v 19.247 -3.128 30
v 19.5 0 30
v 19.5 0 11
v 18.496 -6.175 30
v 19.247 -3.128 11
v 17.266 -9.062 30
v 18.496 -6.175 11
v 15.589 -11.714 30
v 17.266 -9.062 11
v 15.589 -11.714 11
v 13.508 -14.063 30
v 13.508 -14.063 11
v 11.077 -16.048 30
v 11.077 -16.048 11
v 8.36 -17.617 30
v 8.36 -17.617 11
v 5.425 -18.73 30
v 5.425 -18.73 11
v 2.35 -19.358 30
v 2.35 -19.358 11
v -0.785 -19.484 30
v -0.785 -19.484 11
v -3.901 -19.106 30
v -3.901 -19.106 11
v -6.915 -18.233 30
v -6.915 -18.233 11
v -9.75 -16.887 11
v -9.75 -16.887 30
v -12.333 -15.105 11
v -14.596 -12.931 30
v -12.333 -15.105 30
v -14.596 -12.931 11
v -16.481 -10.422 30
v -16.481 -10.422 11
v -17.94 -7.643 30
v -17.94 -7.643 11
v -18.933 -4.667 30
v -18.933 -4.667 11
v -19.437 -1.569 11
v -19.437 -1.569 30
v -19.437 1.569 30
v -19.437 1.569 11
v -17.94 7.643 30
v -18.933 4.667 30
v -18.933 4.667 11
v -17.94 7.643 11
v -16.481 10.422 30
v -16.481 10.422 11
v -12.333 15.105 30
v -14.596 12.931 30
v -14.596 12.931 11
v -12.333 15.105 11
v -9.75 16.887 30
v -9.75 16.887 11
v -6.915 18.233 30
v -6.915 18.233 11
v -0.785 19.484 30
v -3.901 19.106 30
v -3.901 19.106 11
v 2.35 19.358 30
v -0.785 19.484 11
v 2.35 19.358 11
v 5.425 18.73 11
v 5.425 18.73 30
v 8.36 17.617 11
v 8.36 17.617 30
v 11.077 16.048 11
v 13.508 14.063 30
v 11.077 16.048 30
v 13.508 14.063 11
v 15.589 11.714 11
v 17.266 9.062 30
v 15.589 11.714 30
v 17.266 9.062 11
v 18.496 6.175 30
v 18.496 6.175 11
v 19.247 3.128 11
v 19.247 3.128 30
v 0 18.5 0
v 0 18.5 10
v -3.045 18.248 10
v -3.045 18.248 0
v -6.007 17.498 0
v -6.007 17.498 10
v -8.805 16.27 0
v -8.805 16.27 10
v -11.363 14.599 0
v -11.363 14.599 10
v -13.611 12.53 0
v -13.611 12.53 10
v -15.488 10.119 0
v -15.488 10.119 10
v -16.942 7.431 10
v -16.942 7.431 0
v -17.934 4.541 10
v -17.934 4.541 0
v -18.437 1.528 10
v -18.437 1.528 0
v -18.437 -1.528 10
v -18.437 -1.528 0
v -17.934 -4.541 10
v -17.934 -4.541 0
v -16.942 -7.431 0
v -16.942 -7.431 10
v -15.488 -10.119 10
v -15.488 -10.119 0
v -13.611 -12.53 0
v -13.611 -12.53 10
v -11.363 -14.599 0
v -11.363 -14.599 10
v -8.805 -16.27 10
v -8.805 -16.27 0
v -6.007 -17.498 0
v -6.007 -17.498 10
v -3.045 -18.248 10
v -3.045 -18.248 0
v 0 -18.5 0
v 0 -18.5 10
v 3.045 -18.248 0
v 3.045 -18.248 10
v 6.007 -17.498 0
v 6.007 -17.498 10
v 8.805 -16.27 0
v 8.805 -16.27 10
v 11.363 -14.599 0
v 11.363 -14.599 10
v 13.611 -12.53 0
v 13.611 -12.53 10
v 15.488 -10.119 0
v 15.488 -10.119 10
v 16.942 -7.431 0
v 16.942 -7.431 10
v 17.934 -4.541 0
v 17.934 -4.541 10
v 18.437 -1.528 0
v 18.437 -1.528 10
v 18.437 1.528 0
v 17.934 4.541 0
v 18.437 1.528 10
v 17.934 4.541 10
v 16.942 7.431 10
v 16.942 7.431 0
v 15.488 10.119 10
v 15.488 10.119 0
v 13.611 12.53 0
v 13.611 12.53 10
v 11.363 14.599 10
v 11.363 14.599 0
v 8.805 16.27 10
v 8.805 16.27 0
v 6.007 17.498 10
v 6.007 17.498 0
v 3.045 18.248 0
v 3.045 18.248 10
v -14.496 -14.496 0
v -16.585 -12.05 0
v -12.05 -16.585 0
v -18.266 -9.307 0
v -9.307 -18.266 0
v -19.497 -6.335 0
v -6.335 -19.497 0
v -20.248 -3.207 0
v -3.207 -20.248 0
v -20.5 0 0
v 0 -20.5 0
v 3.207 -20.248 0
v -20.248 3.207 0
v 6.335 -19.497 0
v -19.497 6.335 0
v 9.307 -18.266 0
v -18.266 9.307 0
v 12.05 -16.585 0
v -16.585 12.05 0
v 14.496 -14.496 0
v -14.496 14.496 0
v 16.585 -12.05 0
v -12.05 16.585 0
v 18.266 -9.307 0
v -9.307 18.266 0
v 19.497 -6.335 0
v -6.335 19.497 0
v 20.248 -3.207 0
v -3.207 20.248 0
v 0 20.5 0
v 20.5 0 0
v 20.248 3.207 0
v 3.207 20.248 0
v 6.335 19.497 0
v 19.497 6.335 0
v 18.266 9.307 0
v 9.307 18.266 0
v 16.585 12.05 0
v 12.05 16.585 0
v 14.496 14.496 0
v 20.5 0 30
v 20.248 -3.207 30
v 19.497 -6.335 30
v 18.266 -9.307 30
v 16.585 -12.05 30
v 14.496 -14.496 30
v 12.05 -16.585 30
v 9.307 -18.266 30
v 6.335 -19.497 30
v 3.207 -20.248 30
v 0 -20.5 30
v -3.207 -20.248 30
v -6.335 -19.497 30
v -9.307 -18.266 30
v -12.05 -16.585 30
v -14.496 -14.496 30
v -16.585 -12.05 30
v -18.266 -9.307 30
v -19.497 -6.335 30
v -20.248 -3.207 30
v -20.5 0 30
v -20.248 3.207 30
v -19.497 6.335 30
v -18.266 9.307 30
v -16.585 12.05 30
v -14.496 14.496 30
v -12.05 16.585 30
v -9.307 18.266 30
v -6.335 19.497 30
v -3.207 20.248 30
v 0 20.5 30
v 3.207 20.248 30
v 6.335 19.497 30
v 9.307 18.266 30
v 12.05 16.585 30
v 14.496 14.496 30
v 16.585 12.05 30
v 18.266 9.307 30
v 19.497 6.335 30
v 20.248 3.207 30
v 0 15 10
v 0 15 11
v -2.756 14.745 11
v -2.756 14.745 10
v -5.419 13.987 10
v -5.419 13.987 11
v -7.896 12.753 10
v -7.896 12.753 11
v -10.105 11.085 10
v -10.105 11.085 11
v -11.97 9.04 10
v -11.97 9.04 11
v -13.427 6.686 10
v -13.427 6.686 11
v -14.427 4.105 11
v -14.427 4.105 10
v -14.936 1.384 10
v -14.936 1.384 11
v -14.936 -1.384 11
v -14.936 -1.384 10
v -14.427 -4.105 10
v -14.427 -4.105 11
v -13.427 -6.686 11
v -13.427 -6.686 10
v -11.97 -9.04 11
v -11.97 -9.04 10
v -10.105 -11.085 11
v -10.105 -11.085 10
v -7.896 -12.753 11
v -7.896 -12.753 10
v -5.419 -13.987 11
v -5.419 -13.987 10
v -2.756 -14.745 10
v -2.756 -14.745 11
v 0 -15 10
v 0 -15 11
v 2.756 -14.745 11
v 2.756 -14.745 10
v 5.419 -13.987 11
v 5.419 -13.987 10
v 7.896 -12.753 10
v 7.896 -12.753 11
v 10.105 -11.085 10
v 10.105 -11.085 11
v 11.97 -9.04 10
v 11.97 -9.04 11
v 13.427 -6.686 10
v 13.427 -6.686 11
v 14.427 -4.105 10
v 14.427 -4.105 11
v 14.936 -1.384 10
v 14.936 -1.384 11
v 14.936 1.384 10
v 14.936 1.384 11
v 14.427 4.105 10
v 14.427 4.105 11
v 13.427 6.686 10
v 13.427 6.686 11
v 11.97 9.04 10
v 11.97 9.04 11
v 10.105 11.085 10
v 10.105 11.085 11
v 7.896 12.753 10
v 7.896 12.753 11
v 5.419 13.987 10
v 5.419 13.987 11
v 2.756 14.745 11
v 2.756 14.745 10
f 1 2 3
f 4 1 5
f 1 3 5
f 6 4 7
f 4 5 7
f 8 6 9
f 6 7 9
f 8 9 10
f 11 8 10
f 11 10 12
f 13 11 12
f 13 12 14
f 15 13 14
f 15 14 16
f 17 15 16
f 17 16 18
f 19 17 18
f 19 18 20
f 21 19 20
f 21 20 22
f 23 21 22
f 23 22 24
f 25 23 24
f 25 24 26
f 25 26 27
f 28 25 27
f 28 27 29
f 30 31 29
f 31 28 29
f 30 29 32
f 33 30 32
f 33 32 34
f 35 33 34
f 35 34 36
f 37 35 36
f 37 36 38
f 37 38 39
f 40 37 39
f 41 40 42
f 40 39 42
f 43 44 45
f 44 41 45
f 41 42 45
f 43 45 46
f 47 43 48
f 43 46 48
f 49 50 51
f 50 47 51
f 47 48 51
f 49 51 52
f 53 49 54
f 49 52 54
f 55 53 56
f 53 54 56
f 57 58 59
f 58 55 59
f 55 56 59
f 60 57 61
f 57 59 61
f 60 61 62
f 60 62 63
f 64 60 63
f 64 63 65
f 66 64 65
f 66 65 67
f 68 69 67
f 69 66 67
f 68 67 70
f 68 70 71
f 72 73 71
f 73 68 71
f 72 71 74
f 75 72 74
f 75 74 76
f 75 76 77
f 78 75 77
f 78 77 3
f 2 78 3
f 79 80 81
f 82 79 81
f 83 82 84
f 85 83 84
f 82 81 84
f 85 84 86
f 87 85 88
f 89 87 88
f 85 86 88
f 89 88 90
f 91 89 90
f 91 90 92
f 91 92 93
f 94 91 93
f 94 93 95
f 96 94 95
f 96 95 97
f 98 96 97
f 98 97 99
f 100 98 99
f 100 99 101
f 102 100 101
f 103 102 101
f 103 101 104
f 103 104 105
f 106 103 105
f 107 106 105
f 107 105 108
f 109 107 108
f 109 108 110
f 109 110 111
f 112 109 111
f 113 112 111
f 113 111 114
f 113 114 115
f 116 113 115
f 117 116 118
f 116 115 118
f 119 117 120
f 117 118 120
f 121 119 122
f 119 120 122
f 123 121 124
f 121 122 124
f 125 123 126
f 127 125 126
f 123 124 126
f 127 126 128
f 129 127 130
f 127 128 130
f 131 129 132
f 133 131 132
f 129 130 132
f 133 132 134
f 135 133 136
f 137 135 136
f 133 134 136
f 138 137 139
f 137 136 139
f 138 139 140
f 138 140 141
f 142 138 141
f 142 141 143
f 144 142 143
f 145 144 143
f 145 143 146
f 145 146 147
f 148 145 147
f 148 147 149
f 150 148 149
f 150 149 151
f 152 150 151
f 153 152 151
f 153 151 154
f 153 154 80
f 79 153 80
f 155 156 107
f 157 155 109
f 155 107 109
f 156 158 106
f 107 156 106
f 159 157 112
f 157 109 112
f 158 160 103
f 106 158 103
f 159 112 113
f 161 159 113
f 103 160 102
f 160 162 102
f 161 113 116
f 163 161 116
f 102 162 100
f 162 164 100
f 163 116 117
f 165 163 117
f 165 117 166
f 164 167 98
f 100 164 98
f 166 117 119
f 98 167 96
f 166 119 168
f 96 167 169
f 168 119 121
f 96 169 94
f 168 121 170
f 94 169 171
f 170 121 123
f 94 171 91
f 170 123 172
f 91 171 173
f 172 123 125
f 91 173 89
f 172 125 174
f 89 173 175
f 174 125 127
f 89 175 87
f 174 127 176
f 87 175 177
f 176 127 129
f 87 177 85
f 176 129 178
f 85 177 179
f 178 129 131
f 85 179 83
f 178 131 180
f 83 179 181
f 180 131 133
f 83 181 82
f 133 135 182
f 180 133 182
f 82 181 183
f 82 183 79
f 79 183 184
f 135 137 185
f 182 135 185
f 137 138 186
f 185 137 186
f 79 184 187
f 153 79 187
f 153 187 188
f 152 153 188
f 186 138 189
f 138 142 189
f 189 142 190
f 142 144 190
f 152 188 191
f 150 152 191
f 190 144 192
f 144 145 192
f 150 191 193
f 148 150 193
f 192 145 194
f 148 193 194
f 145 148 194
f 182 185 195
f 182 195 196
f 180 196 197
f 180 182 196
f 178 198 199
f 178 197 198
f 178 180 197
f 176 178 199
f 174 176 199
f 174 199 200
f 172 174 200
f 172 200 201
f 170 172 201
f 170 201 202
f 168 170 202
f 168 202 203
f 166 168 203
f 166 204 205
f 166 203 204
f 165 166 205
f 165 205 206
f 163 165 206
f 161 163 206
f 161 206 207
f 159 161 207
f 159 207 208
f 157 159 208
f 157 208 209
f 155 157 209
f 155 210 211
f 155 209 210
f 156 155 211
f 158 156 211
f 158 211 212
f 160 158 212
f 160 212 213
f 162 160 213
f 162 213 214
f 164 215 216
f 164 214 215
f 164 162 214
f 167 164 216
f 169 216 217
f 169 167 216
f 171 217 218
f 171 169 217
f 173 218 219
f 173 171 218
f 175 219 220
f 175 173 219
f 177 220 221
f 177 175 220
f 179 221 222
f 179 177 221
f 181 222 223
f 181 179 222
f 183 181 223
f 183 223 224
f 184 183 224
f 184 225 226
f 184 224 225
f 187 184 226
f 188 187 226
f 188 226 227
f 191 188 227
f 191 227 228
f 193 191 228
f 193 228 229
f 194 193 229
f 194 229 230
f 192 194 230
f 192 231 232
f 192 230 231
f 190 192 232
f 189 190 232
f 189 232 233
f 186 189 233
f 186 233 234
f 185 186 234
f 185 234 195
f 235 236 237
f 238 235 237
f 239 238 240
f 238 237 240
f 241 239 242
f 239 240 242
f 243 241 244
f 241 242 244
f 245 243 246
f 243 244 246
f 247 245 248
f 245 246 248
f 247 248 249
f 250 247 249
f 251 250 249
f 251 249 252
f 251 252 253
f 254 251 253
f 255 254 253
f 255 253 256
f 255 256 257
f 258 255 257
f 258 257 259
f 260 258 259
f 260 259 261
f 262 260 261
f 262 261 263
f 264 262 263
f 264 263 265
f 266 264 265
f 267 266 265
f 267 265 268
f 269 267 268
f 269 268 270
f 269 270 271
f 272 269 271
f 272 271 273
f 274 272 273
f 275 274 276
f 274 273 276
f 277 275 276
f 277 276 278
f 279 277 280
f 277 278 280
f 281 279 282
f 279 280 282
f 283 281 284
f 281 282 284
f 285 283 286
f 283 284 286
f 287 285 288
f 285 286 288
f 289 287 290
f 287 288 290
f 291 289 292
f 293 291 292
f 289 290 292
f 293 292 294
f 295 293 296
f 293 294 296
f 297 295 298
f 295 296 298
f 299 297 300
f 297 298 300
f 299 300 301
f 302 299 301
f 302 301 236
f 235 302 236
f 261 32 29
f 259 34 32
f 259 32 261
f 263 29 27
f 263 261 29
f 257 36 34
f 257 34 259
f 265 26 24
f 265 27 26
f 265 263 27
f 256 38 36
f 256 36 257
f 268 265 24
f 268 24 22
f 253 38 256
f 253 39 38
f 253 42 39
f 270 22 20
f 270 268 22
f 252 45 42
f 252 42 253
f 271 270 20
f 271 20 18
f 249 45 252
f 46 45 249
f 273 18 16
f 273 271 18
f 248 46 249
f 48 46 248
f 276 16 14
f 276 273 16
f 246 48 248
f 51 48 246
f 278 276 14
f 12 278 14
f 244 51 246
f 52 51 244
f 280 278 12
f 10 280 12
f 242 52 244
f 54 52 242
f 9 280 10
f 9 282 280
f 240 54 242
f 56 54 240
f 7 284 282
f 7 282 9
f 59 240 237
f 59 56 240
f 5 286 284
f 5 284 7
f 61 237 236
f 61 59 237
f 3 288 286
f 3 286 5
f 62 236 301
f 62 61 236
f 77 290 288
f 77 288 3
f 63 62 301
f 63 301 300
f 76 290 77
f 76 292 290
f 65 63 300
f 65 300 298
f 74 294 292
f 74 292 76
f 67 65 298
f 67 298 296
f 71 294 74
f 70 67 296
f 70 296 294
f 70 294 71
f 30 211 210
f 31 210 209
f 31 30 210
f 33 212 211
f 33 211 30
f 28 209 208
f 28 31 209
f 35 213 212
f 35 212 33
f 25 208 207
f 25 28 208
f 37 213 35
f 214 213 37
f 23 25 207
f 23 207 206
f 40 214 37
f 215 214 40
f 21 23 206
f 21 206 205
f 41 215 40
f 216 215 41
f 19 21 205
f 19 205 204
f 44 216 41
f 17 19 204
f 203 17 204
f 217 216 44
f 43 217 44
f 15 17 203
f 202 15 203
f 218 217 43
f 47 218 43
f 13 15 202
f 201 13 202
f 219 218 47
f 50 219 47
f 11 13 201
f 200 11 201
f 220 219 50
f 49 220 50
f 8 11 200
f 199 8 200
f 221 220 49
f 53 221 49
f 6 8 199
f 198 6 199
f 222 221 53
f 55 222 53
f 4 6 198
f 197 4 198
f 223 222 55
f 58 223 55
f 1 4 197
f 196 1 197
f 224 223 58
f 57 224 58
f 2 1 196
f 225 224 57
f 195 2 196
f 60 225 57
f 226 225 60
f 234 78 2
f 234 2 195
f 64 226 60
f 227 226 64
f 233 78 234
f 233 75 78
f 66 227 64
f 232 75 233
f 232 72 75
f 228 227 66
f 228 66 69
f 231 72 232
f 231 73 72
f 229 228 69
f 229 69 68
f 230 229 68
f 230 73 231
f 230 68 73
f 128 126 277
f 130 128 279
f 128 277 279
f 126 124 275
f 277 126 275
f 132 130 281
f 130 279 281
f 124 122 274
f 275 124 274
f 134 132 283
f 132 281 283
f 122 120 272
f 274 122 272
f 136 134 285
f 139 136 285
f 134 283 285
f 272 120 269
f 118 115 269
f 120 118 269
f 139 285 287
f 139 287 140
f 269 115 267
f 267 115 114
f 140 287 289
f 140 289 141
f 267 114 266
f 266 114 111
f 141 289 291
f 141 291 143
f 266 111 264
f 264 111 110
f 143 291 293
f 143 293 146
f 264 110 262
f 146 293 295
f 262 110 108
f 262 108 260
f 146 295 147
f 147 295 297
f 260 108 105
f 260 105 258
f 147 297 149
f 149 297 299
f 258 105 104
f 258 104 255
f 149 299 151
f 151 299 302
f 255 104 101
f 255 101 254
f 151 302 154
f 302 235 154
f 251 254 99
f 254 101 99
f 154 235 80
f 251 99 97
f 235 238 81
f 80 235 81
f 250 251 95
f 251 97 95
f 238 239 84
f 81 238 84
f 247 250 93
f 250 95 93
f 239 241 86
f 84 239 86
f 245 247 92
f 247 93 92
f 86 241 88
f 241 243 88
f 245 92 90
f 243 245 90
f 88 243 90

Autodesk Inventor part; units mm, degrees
ref_plane "YZ Plane" through (0, 0, 0) normal (1, 0, 0) x (0, 1, 0)
ref_plane "XZ Plane" through (0, 0, 0) normal (0, 1, 0) x (-1, 0, 0)
ref_plane "XY Plane" through (0, 0, 0) normal (0, 0, 1) x (1, 0, 0)
sketch "Sketch1" plane through (0, 0, 0) normal (0, 0, 1) x (1, 0, 0)
  circle A0 centre (0, 0) radius 20.5
  dimension "d0" = 41
extrude "Extrusion1" add sketch "Sketch1" along normal blind 30
sketch "Sketch2" plane through (0, 0, 0) normal (0, 0, -1) x (-1, 0, 0)
  point P0 (0, 0)
  point P1 (0, 0)
hole "Hole1" at (0, 0, 0) direction (0, 0, 1) diameter 37 depth 10
shell "Shell1" thickness 1 removed faces 1 at (3.5154, 4.1371, 30)
thread "Thread1" size "M39x4" class "6H" standard "ANSI Metric M Profile" full length
sketch "Sketch4" plane through (0, 0, 10) normal (0, 0, -1) x (-1, 0, 0)
  point P0 (0, 0)
  point P1 (0, 0)
hole "Hole2" at (0, 0, 10) direction (0, 0, 1) diameter 30 depth 30
properties part number "Tutup lampu" material "Aluminum 6061-AHC"
